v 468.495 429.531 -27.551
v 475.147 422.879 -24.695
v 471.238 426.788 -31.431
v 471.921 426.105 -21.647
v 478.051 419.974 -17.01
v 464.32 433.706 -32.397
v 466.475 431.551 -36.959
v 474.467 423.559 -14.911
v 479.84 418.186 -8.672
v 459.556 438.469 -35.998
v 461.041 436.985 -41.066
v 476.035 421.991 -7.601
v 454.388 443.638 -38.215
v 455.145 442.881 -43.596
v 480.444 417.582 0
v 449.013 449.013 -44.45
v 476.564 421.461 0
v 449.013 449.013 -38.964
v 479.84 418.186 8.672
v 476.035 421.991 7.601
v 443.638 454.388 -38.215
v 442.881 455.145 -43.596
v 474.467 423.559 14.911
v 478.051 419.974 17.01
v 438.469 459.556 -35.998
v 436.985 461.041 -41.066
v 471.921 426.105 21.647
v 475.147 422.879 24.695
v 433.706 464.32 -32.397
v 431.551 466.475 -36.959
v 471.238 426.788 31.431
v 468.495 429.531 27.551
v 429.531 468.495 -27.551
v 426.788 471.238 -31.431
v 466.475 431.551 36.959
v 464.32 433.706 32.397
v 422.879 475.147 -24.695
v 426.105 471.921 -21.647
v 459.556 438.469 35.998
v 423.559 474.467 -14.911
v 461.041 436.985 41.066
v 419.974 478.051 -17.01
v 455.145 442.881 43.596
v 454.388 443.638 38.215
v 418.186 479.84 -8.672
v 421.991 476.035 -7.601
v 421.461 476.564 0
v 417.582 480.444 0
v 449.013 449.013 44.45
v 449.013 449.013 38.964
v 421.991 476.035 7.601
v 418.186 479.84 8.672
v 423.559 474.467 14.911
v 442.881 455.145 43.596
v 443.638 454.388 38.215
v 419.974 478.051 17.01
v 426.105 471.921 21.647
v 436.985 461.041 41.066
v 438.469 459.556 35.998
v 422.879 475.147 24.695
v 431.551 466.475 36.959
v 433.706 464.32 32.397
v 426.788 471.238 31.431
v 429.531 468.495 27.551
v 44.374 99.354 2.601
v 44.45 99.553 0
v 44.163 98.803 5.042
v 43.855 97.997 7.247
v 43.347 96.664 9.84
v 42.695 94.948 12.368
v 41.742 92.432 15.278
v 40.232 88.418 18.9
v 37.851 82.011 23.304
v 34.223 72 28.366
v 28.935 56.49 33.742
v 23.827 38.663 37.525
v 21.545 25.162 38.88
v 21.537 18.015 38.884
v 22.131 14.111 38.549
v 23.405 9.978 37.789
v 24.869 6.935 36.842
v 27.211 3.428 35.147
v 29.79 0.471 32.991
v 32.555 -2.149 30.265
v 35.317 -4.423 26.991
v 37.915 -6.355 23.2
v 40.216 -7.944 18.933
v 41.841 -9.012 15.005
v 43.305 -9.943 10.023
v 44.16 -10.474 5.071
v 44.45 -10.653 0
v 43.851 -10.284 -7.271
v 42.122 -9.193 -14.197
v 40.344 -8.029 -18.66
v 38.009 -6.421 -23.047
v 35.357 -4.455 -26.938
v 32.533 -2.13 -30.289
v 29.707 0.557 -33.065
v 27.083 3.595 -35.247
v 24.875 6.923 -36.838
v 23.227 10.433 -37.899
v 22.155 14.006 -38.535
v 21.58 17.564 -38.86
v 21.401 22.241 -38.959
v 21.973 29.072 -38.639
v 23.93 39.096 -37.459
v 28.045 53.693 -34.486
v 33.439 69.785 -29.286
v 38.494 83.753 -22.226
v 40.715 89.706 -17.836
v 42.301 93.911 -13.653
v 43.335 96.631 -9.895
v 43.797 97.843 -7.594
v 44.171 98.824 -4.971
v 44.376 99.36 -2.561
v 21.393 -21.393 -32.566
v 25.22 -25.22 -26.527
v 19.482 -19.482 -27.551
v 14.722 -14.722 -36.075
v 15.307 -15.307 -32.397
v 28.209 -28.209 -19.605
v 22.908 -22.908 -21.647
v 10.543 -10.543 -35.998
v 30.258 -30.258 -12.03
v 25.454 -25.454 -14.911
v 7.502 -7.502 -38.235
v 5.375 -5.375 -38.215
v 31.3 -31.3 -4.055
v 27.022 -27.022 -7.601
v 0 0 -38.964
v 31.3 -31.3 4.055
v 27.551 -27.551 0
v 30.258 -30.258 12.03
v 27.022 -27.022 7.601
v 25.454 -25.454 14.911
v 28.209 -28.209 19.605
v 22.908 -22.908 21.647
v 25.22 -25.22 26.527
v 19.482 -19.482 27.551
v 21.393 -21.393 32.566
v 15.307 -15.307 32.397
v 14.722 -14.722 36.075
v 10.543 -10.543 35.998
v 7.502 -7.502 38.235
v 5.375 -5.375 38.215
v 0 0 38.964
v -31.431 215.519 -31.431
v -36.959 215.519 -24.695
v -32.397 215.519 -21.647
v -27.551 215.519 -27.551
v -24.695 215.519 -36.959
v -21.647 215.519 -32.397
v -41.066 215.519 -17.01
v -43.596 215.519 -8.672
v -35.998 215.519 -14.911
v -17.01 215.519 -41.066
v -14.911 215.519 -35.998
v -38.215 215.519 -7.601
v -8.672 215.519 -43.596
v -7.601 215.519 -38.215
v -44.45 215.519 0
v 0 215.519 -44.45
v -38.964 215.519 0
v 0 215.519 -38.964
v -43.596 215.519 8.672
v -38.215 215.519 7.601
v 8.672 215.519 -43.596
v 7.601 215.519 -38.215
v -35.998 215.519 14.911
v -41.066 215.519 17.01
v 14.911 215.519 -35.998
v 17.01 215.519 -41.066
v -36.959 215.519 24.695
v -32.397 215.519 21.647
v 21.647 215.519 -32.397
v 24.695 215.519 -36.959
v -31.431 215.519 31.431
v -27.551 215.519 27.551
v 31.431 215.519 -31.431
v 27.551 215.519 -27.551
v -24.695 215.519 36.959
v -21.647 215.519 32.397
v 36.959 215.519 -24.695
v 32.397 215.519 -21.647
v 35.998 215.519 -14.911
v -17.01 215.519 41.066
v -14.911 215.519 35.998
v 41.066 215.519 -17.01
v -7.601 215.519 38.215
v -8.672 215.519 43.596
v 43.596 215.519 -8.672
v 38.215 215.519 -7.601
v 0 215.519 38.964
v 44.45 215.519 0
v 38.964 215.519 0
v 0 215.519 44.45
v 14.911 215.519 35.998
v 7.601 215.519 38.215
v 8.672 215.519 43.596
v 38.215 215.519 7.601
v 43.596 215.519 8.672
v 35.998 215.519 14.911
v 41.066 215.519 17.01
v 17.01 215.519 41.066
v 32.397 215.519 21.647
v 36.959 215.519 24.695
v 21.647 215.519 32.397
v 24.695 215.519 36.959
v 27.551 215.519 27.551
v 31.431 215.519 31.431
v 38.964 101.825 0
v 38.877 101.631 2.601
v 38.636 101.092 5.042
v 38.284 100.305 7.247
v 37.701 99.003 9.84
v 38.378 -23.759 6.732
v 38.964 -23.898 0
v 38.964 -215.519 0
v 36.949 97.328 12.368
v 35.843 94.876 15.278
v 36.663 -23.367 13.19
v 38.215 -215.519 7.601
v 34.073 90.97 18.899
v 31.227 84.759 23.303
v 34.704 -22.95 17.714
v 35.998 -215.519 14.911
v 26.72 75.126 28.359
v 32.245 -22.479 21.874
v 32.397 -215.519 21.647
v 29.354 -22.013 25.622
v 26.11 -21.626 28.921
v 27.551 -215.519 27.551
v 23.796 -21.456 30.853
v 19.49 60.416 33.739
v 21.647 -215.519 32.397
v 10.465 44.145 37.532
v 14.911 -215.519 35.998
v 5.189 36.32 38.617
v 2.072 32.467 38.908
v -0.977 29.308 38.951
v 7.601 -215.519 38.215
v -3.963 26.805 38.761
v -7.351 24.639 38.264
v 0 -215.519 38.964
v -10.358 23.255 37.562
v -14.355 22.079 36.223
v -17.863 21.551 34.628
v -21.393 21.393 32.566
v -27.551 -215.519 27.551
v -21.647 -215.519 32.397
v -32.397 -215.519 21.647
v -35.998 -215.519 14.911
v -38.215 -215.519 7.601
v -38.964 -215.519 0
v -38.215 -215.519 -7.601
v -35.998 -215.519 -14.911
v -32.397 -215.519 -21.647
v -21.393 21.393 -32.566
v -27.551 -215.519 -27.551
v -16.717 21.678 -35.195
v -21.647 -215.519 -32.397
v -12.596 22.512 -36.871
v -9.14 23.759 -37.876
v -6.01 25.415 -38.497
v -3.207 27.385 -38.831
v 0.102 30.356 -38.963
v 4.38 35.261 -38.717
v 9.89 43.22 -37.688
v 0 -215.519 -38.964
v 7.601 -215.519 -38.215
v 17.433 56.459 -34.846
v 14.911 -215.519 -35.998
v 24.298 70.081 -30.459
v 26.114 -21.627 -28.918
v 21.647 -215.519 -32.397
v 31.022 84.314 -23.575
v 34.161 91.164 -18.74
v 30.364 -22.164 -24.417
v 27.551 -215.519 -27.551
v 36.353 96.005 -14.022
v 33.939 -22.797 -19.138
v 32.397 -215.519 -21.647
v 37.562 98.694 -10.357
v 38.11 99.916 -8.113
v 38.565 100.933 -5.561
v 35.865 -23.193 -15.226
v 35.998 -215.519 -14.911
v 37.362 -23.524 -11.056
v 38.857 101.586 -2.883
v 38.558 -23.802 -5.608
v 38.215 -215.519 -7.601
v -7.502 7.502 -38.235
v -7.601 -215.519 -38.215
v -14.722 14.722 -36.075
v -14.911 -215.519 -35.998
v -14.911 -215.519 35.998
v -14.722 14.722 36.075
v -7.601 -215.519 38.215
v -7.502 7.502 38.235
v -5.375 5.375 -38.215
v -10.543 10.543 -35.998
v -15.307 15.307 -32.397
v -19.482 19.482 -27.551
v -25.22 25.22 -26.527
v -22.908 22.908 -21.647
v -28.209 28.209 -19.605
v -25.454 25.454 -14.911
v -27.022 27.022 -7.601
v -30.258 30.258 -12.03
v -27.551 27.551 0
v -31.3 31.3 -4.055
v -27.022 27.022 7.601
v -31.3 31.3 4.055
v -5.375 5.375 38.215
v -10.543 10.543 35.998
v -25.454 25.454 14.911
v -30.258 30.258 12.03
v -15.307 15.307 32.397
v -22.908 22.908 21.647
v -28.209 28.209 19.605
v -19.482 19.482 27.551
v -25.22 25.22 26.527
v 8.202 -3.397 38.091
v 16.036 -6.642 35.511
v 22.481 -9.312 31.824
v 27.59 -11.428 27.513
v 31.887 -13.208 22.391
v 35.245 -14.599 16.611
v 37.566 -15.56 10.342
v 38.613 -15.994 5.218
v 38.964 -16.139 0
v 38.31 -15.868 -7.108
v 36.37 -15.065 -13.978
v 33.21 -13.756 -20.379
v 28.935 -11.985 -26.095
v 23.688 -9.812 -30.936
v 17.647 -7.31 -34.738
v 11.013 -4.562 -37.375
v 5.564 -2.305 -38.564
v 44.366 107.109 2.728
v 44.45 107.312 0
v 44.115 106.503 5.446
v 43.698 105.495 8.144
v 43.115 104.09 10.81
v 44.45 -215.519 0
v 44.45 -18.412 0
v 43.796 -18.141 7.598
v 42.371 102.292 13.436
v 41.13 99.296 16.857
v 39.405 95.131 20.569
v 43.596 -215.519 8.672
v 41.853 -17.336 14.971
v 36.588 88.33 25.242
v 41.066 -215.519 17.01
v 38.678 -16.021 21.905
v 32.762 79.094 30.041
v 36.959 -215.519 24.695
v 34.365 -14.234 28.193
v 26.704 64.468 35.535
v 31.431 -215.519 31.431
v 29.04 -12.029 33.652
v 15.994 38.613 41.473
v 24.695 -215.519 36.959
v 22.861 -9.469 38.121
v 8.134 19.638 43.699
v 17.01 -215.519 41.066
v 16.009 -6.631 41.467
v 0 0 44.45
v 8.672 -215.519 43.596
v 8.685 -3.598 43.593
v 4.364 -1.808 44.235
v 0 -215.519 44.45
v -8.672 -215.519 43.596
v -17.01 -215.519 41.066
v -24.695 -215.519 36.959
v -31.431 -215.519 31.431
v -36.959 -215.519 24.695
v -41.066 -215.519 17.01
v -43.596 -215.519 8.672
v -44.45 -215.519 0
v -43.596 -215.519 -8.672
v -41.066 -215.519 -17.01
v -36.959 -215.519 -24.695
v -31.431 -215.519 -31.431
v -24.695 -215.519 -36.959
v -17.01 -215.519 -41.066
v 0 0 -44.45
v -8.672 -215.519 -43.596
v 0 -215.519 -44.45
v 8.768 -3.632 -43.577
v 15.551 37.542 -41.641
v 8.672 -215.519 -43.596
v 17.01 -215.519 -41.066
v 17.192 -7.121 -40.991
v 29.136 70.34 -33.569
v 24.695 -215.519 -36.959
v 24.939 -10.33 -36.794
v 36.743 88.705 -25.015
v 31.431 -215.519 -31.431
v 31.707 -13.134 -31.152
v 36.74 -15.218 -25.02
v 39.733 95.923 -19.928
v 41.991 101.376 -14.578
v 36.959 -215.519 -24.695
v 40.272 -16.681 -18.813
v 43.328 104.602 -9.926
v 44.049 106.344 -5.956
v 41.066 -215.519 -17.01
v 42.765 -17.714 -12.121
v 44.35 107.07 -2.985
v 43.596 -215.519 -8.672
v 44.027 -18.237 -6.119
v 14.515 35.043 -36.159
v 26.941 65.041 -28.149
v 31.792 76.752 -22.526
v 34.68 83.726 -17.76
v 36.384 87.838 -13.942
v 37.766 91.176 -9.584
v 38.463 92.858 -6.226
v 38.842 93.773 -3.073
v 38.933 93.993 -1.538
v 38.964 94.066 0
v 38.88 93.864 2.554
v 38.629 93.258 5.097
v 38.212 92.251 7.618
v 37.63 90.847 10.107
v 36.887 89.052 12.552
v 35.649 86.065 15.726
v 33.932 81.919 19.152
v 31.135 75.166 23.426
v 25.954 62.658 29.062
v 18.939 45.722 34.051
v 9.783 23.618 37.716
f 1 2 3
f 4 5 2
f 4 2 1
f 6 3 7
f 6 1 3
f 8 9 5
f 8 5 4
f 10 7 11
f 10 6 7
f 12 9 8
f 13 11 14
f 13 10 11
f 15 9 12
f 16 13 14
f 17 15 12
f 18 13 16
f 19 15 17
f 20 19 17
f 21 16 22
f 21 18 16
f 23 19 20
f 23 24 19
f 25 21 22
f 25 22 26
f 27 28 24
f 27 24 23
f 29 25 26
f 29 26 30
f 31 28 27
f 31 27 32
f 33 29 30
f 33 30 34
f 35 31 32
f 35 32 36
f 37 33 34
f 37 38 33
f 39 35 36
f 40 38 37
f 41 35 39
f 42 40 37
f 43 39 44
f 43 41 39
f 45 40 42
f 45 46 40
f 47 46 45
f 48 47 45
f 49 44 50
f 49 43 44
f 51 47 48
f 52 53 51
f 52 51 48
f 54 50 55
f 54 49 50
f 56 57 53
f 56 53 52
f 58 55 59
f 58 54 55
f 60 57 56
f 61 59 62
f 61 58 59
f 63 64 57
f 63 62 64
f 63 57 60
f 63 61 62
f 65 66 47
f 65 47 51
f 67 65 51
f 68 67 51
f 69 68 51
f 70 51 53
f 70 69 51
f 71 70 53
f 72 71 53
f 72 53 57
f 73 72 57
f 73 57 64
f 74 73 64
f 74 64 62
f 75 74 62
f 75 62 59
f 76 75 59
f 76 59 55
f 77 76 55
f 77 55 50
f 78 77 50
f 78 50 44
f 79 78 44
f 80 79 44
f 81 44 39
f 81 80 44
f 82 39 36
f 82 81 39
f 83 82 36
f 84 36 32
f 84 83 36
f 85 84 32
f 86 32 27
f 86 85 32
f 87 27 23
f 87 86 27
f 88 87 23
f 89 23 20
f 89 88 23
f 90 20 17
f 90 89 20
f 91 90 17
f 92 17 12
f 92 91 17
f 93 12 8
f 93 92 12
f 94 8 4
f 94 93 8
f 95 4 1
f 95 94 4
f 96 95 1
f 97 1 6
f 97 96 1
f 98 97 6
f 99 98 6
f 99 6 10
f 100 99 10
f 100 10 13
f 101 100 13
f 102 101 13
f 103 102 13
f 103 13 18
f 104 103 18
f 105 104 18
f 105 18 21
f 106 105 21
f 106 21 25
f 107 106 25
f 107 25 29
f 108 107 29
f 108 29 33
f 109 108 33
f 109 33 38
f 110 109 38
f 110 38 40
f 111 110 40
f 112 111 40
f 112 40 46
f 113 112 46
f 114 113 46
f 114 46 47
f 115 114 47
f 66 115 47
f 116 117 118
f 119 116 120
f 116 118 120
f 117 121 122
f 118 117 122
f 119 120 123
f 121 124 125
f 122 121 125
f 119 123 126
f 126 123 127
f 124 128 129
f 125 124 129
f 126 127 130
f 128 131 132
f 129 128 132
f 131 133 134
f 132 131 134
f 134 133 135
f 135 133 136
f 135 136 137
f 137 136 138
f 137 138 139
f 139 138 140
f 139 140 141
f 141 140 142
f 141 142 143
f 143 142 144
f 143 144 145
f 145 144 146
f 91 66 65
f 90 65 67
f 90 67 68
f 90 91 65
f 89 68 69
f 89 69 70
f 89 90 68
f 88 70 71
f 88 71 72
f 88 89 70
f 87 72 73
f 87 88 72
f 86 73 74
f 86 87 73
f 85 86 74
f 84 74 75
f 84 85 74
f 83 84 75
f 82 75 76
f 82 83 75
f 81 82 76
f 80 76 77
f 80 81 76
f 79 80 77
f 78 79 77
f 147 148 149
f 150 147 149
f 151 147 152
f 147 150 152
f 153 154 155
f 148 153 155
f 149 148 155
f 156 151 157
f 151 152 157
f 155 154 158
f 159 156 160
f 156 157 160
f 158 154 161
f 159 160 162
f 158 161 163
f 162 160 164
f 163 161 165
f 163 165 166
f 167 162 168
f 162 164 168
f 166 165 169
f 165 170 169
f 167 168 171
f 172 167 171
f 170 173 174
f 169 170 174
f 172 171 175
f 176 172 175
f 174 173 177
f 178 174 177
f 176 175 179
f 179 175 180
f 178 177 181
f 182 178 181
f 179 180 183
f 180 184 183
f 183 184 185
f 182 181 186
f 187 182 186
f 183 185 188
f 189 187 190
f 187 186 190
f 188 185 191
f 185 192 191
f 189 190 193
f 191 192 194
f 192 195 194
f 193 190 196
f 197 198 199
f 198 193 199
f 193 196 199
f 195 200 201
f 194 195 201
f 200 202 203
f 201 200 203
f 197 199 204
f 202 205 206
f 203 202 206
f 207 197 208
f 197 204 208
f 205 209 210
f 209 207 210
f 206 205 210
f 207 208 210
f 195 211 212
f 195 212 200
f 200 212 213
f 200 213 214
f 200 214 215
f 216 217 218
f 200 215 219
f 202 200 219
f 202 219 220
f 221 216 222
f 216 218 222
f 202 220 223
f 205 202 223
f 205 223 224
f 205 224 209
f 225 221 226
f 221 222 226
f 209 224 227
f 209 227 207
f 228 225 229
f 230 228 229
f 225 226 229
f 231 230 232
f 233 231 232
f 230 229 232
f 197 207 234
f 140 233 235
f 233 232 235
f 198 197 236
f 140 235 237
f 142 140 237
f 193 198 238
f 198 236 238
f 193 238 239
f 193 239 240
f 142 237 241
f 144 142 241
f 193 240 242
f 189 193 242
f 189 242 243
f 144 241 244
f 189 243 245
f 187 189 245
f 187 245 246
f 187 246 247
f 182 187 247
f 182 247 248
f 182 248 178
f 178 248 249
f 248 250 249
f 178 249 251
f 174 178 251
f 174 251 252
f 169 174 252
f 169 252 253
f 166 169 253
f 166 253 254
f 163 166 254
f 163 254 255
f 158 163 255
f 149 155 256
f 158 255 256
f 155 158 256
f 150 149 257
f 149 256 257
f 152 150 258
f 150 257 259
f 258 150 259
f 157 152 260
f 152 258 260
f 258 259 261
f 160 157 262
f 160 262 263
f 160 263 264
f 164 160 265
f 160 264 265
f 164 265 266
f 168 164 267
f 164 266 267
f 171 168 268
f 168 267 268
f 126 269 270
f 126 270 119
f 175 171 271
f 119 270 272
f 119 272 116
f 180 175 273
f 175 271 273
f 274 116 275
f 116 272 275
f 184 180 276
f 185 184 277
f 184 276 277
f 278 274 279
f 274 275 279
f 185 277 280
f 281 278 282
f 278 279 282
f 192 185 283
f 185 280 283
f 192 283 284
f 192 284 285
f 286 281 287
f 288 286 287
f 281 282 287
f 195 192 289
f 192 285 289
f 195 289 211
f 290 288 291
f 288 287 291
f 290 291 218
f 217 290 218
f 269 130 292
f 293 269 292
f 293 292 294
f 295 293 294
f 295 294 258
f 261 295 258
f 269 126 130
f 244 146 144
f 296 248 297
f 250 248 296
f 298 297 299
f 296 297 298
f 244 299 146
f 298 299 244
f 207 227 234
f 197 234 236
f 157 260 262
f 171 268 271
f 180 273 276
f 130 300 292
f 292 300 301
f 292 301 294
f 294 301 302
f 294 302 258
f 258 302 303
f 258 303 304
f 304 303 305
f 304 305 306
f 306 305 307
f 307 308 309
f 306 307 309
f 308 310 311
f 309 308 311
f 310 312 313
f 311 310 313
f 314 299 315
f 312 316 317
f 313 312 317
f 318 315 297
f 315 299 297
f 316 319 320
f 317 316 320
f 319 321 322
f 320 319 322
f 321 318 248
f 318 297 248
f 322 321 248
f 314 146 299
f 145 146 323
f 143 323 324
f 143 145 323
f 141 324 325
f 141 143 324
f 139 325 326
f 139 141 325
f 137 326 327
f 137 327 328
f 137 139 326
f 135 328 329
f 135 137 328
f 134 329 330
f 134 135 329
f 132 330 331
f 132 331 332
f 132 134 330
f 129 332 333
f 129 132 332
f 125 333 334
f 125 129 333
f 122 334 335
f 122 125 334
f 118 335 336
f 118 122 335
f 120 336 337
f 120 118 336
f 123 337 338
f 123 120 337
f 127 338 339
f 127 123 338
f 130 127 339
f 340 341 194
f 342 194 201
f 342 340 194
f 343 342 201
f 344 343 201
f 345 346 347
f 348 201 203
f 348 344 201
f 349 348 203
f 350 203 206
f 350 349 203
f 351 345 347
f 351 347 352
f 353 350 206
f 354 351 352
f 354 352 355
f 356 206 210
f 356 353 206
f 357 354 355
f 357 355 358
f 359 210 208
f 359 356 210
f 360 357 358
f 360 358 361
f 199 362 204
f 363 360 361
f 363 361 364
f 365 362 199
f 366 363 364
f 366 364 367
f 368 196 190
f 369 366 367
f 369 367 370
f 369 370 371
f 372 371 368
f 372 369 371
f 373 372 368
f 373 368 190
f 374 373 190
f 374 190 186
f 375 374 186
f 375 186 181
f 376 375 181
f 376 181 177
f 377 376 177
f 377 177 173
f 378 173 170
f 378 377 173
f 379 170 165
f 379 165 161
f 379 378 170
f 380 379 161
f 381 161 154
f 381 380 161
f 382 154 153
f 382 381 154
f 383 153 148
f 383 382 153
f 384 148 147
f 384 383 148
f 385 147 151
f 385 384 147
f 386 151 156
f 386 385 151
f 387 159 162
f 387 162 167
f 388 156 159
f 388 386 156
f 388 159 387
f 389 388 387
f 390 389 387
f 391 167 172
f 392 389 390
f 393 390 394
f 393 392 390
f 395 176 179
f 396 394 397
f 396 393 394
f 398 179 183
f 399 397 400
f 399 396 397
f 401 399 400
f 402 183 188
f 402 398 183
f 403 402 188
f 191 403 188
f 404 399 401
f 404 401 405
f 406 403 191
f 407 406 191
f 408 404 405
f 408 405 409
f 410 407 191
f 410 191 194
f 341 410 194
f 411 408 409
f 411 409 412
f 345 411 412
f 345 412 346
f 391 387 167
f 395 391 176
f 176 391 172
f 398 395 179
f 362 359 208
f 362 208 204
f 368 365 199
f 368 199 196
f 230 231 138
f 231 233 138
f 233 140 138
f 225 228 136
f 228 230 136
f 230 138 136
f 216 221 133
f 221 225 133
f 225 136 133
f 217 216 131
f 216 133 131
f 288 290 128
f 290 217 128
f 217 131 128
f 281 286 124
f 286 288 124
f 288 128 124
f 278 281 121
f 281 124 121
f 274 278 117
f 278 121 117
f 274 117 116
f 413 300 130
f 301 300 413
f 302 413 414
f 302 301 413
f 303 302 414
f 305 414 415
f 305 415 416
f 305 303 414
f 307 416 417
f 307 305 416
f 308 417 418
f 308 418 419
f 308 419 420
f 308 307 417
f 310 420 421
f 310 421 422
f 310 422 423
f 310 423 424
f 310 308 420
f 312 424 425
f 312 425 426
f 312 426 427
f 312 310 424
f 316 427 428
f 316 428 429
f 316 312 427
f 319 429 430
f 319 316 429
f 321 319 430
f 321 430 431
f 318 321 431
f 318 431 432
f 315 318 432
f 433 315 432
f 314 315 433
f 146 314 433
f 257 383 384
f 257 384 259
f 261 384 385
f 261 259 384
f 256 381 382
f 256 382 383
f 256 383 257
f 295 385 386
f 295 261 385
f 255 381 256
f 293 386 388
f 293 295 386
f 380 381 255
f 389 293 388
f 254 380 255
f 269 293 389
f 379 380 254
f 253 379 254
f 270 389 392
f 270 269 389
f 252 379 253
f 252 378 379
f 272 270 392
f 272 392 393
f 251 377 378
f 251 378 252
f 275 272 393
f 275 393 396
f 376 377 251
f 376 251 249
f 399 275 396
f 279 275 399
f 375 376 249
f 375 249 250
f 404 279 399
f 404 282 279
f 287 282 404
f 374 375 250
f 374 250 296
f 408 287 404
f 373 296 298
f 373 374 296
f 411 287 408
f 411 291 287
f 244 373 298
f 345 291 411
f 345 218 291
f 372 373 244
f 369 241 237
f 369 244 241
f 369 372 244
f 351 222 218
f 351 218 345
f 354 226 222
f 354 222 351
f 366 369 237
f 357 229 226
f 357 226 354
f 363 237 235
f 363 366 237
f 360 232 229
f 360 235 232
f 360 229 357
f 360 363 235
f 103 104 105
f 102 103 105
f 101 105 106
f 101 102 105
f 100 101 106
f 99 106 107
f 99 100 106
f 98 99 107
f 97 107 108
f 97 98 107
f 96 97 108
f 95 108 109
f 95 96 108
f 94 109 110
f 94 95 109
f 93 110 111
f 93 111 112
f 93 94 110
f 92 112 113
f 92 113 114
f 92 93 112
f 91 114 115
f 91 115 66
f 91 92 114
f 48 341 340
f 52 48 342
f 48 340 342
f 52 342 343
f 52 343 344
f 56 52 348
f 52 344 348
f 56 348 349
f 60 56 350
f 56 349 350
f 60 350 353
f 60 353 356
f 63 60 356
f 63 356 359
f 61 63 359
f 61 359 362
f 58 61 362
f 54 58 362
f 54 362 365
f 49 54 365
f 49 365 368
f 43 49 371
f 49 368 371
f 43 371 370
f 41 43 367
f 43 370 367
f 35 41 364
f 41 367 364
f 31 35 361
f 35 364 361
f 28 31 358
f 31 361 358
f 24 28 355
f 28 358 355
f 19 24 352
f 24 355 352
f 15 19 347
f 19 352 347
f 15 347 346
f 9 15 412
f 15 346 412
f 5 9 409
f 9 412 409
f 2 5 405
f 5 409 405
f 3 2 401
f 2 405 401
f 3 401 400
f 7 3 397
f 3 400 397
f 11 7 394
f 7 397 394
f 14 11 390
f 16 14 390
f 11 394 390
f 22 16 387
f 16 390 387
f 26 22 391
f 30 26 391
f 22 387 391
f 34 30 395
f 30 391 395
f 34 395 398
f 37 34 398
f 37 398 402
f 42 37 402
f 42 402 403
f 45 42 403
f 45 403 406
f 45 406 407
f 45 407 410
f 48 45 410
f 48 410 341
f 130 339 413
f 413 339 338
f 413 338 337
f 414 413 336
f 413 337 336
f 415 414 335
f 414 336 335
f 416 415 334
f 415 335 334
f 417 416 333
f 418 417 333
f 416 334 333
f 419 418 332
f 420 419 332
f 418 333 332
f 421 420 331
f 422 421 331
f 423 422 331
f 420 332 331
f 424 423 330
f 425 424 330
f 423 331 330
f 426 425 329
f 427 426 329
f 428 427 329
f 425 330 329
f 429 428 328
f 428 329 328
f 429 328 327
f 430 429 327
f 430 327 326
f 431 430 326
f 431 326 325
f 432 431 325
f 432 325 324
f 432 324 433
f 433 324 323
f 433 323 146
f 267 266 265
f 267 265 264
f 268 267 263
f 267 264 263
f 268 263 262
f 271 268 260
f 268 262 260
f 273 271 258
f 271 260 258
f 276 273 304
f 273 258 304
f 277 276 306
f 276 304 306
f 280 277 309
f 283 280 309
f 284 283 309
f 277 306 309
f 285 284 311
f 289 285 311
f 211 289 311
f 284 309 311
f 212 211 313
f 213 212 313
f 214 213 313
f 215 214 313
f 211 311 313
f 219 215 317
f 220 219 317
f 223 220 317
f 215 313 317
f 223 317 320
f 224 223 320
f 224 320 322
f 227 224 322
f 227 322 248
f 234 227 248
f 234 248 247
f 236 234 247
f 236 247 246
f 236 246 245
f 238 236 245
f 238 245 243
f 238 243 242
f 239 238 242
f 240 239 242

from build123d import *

# Parameters (mm, degrees)
F0_R          = 44.45
F0_R_2        = 38.9636
F1_DEPTH      = 215.519
F1_DEPTH_BACK = 215.519
F3_R          = 44.45
F3_R_2        = 38.9636
F4_DEPTH      = 635


with BuildPart() as f1:
    # F0 (on Front) → F1 (new body, two sides)
    with BuildSketch(Plane.XZ) as f1_sk:
        Circle(F0_R)
        Circle(F0_R_2, mode=Mode.SUBTRACT)
    extrude(amount=F1_DEPTH)
    extrude(f1_sk.sketch, amount=-F1_DEPTH_BACK)

    # F3 (on face) → F4 (join)
    with BuildSketch(Plane(origin=(0, 0, 0), x_dir=(-0.7071067812, 0.7071067812, 0), z_dir=(0.7071067812, 0.7071067812, 0))):
        Circle(F3_R)
        Circle(F3_R_2, mode=Mode.SUBTRACT)
    extrude(amount=F4_DEPTH)


solid = f1.part
